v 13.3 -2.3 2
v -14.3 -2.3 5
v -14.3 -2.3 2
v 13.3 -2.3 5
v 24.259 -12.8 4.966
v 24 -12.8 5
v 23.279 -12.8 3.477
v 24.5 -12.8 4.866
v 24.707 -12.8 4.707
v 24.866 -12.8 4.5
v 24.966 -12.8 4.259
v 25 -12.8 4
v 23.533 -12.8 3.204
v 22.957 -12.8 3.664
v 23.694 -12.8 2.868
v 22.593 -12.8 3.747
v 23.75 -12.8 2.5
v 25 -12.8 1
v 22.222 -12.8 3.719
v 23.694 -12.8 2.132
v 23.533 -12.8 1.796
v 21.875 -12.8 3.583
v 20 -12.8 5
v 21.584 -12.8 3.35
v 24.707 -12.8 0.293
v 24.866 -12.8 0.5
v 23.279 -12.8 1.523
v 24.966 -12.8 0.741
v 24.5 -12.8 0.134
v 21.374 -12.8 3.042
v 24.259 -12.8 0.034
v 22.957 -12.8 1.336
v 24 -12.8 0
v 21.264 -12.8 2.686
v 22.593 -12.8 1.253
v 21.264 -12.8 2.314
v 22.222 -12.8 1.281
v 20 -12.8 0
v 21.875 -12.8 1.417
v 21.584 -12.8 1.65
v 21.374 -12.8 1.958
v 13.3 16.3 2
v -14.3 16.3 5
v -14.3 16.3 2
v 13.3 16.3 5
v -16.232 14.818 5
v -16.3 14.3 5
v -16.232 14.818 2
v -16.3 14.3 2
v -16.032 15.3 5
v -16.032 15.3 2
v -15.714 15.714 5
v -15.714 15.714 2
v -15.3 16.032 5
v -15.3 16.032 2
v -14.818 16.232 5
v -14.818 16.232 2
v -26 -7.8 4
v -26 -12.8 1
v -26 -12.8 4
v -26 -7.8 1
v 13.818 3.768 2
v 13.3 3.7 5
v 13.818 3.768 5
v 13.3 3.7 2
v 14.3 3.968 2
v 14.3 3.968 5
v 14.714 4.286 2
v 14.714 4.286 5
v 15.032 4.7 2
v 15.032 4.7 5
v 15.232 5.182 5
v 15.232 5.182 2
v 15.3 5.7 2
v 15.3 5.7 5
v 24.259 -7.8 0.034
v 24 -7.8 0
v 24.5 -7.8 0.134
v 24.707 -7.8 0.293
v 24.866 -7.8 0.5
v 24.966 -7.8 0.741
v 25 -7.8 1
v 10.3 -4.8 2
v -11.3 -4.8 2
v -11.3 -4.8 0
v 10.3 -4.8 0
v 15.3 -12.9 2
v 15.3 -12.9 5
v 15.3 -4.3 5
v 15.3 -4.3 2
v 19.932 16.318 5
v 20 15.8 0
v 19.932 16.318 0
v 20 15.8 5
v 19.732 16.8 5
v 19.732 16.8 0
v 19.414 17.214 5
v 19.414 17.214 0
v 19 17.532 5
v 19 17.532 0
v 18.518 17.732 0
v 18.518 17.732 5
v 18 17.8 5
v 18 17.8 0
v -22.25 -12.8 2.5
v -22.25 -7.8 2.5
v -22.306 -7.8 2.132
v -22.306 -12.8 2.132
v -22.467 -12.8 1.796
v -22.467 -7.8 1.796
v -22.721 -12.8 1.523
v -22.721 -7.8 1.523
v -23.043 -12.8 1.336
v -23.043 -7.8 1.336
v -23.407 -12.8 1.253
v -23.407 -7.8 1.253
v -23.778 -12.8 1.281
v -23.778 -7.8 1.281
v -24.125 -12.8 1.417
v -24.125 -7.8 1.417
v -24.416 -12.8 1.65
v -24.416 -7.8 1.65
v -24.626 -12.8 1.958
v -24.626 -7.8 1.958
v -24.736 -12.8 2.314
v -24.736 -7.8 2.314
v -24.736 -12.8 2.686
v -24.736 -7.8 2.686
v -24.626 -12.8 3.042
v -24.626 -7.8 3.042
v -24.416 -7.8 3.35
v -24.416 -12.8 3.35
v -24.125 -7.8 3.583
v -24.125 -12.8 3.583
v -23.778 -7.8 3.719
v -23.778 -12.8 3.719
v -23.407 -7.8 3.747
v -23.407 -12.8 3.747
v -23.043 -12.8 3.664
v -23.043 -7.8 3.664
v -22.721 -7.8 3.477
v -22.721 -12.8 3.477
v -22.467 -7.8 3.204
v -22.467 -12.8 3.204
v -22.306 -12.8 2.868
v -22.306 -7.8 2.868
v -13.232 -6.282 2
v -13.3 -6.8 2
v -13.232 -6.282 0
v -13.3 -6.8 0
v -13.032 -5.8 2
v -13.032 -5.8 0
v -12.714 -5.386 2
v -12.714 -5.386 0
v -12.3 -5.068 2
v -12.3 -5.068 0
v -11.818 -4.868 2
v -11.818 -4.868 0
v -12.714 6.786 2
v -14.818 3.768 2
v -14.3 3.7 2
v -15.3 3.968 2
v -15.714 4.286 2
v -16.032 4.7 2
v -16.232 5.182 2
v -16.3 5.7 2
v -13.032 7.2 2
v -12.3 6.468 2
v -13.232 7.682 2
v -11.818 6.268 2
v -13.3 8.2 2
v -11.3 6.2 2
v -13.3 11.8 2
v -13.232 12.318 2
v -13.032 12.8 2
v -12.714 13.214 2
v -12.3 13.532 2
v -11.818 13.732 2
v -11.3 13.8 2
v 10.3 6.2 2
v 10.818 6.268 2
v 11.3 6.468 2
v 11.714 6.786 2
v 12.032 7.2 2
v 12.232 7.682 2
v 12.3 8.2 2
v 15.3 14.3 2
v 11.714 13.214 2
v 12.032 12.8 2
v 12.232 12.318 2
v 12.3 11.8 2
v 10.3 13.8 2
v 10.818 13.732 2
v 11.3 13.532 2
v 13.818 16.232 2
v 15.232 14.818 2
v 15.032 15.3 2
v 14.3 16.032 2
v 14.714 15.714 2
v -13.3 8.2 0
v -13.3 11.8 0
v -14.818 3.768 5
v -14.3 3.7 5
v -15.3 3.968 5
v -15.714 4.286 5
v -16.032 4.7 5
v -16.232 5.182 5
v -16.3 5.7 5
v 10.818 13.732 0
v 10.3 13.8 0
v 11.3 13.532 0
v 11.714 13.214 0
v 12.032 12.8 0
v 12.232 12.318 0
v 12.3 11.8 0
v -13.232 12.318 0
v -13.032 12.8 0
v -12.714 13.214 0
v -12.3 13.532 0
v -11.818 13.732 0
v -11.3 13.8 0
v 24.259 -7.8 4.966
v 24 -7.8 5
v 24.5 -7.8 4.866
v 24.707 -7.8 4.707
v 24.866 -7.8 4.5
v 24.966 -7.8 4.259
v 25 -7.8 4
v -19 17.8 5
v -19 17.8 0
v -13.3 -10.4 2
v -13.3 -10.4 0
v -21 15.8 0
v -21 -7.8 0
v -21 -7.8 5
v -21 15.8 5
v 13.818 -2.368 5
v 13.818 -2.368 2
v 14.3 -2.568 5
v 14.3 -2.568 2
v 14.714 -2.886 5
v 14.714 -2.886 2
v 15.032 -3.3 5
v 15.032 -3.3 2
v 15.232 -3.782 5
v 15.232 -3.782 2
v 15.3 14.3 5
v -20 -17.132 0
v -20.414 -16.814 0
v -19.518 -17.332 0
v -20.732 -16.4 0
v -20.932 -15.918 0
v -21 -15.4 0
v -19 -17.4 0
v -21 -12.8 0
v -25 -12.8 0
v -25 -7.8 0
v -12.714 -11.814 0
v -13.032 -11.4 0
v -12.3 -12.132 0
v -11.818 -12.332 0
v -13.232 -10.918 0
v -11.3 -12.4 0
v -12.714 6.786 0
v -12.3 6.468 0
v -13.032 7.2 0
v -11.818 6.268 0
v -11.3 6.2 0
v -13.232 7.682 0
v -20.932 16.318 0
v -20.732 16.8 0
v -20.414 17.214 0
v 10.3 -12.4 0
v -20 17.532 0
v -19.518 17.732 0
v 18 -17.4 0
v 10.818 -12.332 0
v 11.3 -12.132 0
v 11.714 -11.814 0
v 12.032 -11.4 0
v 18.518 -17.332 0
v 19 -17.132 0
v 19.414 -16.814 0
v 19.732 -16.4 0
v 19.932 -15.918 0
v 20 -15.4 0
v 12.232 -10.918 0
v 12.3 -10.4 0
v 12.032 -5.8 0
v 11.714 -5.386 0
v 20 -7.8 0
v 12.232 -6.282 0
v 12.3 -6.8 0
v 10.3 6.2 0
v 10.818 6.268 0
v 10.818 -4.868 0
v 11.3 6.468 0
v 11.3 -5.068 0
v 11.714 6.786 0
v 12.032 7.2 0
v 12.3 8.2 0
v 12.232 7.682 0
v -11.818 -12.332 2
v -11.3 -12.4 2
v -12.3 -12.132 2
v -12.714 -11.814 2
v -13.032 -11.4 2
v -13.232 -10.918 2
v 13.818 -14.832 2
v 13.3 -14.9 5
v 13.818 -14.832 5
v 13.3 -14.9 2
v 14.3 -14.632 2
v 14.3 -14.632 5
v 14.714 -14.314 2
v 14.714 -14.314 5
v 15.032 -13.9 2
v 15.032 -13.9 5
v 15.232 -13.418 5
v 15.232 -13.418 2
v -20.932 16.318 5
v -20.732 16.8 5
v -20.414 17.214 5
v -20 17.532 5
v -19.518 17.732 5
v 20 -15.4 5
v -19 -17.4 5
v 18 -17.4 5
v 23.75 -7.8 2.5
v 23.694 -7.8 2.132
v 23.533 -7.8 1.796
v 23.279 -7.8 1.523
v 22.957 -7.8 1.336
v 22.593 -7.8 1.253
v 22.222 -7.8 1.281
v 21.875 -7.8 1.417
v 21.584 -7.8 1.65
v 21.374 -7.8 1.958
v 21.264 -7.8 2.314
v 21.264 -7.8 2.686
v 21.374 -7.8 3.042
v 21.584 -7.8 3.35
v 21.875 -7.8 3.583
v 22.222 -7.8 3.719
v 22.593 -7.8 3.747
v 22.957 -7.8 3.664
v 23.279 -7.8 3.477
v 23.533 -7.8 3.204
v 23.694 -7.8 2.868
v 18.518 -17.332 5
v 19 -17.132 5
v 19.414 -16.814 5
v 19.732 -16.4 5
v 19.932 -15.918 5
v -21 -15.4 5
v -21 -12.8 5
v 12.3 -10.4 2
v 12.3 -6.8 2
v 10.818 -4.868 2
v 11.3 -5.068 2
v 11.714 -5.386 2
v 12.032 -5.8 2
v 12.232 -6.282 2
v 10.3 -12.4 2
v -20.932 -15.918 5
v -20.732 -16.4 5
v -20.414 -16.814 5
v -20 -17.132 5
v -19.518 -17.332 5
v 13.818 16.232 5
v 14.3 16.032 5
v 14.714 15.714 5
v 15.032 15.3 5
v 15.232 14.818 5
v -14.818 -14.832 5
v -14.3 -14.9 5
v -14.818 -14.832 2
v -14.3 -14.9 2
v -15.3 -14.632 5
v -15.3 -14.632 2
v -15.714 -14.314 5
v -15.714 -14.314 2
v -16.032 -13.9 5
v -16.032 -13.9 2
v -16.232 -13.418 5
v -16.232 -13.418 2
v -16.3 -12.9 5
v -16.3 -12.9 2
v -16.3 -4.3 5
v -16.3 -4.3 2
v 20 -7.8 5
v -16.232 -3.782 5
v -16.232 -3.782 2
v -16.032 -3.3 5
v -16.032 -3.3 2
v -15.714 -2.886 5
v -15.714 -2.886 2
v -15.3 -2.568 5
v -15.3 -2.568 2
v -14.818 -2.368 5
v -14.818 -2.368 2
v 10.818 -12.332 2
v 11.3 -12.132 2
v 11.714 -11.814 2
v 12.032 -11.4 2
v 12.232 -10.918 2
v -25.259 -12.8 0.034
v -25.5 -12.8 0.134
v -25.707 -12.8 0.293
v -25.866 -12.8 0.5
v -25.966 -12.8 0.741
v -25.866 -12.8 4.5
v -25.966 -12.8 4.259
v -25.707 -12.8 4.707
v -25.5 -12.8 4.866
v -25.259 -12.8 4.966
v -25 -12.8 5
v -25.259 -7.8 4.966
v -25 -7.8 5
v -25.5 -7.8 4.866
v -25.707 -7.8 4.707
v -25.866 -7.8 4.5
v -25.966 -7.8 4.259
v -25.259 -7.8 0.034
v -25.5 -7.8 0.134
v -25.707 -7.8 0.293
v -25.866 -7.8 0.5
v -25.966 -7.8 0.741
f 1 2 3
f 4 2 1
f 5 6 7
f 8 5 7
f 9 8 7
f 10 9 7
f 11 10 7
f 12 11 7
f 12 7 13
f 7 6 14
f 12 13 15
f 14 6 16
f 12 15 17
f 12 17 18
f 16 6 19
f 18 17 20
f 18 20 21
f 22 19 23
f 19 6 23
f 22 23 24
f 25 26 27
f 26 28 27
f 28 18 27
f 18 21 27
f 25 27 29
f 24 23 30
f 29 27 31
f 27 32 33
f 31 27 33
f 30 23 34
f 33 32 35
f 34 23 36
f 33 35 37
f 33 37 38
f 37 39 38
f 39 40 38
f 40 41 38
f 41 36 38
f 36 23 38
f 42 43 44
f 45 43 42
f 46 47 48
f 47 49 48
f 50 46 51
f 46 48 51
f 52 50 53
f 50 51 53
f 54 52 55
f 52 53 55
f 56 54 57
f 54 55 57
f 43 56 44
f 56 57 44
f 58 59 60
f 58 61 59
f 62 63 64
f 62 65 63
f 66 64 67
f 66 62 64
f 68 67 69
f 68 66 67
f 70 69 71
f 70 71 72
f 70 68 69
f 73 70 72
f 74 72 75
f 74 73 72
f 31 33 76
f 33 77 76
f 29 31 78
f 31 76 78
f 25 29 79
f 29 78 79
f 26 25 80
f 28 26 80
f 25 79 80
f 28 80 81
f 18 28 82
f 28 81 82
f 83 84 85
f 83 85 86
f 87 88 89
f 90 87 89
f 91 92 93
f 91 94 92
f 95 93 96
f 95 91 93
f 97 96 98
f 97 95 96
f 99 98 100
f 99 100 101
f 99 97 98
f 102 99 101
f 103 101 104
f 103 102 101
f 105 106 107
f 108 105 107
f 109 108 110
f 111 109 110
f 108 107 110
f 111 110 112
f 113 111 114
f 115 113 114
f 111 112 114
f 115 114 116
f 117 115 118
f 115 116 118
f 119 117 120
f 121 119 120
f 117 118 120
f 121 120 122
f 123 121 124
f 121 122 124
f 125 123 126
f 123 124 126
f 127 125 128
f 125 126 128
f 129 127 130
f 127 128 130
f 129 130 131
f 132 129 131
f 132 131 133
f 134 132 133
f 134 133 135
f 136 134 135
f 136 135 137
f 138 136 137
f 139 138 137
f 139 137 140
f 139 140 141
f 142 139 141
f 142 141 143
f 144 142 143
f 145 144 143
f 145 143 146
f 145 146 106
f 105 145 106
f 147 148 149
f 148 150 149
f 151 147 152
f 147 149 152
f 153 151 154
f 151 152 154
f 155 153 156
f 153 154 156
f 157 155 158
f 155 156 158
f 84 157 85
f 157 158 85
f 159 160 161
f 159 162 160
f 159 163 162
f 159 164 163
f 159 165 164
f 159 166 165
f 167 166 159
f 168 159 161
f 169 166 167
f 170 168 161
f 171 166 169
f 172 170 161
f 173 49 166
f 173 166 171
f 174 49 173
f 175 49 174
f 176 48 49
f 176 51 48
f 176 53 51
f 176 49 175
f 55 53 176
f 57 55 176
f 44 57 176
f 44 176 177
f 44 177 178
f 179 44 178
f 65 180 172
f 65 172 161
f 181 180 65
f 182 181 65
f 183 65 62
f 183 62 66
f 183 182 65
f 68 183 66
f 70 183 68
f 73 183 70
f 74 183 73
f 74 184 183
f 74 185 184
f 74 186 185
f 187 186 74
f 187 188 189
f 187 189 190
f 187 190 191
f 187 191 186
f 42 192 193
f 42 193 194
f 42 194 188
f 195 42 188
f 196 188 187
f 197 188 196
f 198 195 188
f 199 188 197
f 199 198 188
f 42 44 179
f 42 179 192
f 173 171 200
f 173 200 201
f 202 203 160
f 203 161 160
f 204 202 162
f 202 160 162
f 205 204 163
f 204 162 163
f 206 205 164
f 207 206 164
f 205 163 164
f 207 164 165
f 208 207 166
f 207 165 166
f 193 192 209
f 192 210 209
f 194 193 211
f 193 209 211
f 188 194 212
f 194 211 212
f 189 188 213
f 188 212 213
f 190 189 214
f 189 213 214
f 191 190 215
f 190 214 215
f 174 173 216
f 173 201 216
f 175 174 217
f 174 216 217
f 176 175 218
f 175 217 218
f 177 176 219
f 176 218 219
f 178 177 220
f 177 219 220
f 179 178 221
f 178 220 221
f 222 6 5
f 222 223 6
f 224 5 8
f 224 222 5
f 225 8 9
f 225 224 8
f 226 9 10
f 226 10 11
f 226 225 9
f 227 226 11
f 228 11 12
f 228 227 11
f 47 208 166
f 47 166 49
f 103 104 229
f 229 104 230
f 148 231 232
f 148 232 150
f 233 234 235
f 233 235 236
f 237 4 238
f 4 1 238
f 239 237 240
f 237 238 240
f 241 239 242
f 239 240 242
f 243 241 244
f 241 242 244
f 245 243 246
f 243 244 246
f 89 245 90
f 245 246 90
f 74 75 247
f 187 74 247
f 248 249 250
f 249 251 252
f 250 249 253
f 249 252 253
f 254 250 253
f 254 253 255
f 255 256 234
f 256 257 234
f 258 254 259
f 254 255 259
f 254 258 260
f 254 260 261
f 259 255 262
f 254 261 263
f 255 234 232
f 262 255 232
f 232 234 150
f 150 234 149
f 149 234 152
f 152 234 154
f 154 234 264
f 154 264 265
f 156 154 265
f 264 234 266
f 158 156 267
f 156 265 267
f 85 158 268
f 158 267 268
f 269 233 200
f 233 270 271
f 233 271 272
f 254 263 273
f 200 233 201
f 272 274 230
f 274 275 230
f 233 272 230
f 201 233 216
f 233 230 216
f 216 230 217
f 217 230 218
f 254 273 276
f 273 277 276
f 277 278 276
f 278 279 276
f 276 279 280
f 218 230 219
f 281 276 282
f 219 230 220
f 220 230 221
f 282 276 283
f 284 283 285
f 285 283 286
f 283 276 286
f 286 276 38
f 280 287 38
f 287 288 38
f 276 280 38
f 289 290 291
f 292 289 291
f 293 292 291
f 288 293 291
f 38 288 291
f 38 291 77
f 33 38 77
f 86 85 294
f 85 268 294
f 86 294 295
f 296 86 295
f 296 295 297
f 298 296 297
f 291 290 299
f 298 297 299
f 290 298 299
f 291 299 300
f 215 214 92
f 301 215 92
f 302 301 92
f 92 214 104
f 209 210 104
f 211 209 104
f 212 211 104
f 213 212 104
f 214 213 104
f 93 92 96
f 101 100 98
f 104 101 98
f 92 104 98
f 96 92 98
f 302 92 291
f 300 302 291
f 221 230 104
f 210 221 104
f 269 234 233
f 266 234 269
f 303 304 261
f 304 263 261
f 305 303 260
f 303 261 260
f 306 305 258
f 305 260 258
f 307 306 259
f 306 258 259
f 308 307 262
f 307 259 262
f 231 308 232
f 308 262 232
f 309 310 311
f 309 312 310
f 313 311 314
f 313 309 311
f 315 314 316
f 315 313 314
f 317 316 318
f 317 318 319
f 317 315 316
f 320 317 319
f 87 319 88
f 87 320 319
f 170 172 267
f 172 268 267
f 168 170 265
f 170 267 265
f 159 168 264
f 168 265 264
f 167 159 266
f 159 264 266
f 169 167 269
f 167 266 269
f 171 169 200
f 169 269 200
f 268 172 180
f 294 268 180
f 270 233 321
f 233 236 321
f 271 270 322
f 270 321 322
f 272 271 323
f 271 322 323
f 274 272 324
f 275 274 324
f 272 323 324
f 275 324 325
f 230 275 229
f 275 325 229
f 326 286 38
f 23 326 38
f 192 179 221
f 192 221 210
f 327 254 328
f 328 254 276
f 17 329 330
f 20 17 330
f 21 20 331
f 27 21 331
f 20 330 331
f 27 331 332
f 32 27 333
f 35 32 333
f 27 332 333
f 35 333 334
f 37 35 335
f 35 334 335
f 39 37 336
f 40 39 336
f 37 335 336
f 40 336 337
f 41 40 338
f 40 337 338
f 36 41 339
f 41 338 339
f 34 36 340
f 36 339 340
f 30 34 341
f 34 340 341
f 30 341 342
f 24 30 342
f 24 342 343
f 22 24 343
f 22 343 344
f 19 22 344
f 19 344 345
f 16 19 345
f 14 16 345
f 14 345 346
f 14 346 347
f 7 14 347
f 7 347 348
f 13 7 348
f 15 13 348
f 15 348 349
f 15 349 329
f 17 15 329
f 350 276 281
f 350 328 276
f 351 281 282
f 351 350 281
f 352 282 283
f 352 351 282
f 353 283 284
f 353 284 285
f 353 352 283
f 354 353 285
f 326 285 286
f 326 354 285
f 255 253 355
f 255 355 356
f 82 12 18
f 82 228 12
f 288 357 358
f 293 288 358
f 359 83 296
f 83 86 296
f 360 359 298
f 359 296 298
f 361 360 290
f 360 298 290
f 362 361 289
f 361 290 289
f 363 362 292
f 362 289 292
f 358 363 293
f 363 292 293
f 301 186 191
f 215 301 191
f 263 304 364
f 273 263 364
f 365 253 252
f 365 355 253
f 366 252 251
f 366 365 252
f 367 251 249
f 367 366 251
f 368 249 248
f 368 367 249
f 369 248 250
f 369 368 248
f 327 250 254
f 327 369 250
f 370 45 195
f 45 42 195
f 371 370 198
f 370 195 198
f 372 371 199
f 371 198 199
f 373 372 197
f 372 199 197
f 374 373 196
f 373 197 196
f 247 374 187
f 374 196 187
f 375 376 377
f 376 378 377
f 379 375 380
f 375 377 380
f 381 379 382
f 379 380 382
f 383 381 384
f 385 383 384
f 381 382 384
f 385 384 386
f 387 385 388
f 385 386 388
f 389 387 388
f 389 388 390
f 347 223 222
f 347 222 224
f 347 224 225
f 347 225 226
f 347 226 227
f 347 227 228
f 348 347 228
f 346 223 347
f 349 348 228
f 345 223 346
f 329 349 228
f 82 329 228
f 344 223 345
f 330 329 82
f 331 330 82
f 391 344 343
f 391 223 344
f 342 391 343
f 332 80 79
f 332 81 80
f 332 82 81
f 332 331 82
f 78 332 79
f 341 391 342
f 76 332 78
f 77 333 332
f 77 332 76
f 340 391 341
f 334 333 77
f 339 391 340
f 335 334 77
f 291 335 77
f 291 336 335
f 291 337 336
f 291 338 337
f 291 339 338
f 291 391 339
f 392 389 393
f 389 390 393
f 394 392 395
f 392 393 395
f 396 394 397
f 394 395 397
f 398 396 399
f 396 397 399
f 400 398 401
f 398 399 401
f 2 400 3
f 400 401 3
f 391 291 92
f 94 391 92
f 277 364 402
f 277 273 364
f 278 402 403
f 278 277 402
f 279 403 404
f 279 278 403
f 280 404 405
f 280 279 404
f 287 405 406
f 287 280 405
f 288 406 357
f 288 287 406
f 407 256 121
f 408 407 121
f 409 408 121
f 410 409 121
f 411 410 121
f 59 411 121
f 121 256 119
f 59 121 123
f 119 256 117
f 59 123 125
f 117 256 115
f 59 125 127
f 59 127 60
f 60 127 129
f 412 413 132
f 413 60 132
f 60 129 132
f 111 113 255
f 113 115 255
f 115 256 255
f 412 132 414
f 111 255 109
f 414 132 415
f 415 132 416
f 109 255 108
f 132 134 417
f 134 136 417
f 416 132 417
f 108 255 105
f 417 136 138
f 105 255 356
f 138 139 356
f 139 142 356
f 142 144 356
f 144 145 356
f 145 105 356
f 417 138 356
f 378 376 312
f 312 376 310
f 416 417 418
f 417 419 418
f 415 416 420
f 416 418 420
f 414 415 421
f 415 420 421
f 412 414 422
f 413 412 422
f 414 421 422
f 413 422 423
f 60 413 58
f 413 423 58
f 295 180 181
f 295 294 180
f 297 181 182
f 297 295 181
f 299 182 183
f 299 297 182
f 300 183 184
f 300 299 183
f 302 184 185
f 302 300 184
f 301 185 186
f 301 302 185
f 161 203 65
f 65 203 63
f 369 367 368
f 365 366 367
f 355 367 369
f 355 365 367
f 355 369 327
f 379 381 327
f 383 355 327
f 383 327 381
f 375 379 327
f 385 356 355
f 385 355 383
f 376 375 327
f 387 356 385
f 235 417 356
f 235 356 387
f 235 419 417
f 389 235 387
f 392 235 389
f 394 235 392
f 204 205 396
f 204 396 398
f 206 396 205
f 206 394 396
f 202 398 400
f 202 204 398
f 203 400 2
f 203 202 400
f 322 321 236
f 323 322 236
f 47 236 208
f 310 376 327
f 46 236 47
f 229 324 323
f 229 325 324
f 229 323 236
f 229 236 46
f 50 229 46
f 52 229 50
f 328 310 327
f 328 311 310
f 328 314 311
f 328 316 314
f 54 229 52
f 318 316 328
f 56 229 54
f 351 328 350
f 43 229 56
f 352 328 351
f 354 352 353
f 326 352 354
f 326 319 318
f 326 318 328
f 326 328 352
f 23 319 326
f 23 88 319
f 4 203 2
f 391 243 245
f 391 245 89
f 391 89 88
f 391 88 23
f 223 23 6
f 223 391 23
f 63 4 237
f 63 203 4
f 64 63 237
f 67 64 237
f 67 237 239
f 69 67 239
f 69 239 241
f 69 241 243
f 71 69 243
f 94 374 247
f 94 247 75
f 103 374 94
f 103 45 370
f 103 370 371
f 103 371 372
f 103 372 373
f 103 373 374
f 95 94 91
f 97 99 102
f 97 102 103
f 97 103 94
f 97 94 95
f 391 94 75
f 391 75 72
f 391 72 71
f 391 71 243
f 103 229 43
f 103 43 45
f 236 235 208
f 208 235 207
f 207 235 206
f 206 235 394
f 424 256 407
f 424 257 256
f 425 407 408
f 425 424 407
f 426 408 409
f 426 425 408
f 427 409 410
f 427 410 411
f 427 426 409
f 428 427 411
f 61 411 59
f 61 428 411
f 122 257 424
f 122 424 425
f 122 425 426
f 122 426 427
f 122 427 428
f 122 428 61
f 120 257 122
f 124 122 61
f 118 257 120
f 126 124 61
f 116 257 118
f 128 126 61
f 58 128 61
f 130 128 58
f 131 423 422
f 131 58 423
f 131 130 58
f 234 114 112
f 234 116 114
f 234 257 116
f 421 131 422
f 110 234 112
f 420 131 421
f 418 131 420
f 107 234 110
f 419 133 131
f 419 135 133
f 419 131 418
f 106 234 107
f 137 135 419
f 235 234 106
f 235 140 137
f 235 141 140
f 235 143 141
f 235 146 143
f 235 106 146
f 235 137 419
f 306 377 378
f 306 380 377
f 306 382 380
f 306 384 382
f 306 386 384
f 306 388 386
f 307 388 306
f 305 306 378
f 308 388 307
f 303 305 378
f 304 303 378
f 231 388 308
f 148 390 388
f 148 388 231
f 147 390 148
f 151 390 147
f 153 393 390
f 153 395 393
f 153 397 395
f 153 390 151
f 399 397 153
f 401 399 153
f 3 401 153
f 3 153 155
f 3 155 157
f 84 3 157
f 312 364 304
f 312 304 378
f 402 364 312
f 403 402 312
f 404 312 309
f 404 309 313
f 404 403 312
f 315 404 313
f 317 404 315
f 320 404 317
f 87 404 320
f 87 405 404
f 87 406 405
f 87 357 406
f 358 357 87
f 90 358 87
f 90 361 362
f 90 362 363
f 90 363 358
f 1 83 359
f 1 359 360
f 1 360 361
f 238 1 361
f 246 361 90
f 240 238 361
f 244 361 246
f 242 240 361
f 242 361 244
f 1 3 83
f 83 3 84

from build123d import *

# Parameters (mm, degrees)
SKETCH1_W                 = 42
SKETCH1_H                 = 43
BOSS_EXTRUDE1_DEPTH       = 5
SKETCH2_W                 = 31.6
SKETCH2_H                 = 12.6
CUT_EXTRUDE1_DEPTH        = 3
SKETCH3_W                 = 25.6
SKETCH3_H                 = 7.6
CUT_EXTRUDE2_DEPTH        = 3
CUT_EXTRUDE3_DEPTH        = 5
SKETCH5_W                 = 5
SKETCH5_H                 = 5
BOSS_EXTRUDE2_DEPTH       = 5
SKETCH6_W                 = 5
SKETCH6_H                 = 5
BOSS_EXTRUDE3_DEPTH       = 5
FILLET1_R                 = 2
FILLET2_R                 = 1
M3X0_5_TAPPED_HOLE1_D     = 2.5
M3X0_5_TAPPED_HOLE1_DEPTH = 7.5
M3X0_5_TAPPED_HOLE1_TIP   = 0.751075774


with BuildPart() as part:
    # Sketch1 → Boss-Extrude1 (new body)
    with BuildSketch(Plane.XY):
        Rectangle(SKETCH1_W, SKETCH1_H)
    extrude(amount=BOSS_EXTRUDE1_DEPTH)

    # Sketch2 → Cut-Extrude1 (cut)
    with BuildSketch(Plane.XY.offset(5)):
        with Locations((-0.5, 10)):
            Rectangle(SKETCH2_W, SKETCH2_H)
        with Locations((-0.5, -8.6)):
            Rectangle(SKETCH2_W, SKETCH2_H)
    extrude(amount=-CUT_EXTRUDE1_DEPTH, mode=Mode.SUBTRACT)

    # Sketch3 → Cut-Extrude2 (cut)
    with BuildSketch(Plane.XY.offset(2)):
        with Locations((-0.5, 10)):
            Rectangle(SKETCH3_W, SKETCH3_H)
        with Locations((-0.5, -8.6)):
            Rectangle(SKETCH3_W, SKETCH3_H)
    extrude(amount=-CUT_EXTRUDE2_DEPTH, mode=Mode.SUBTRACT)

    # Sketch4 → Cut-Extrude3 (cut)
    with BuildSketch(Plane(origin=(0, 0, 0), x_dir=(-1, 0, 0), z_dir=(0, 0, -1))):
        Polygon((-15.288574128, 21.5), (-21, 21.5), (-21, 16.307906388), (-21, -16.83473783), (-21, -21.5), (-15.288574128, -21.5), (16.313805872, -21.5), (21, -21.5), (21, -17.4), (-20, -17.4), (-20, 17.8), (21, 17.8), (21, 21.5), (16.313805872, 21.5), align=None)
    extrude(amount=-CUT_EXTRUDE3_DEPTH, mode=Mode.SUBTRACT)

    # Sketch5 → Boss-Extrude2 (add)
    with BuildSketch(Plane(origin=(20, 0, 0), x_dir=(0, 0, -1), z_dir=(1, 0, 0))):
        with Locations((-2.5, -10.3)):
            Rectangle(SKETCH5_W, SKETCH5_H)
    extrude(amount=BOSS_EXTRUDE2_DEPTH)

    # Sketch6 → Boss-Extrude3 (add)
    with BuildSketch(Plane.ZY.offset(21)):
        with Locations((2.5, -10.3)):
            Rectangle(SKETCH6_W, SKETCH6_H)
    extrude(amount=BOSS_EXTRUDE3_DEPTH)

    # Fillet1
    fillet1_edges = [part.edges().sort_by_distance(p)[0] for p in [
        (-16.3, 3.7, 3.5),
        (-16.3, 16.3, 3.5),
        (15.3, 16.3, 3.5),
        (15.3, 3.7, 3.5),
        (-16.3, -14.9, 3.5),
        (-16.3, -2.3, 3.5),
        (15.3, -2.3, 3.5),
        (15.3, -14.9, 3.5),
        (-13.3, 6.2, 1),
        (-13.3, 13.8, 1),
        (12.3, 13.8, 1),
        (12.3, 6.2, 1),
        (-13.3, -12.4, 1),
        (-13.3, -4.8, 1),
        (12.3, -4.8, 1),
        (12.3, -12.4, 1),
        (20, 17.8, 2.5),
        (20, -17.4, 2.5),
        (-21, -17.4, 2.5),
        (-21, 17.8, 2.5),
    ]]
    fillet(fillet1_edges, radius=FILLET1_R)

    # Fillet2
    fillet2_edges = [part.edges().sort_by_distance(p)[0] for p in [
        (25, -10.3, 0),
        (25, -10.3, 5),
        (-26, -10.3, 0),
        (-26, -10.3, 5),
    ]]
    fillet(fillet2_edges, radius=FILLET2_R)

    # M3x0.5 Tapped Hole1
    with Locations(Plane(origin=(-23.5, -12.8, 2.5), x_dir=(-1, 0, 0), z_dir=(0, -1, 0))):
        with Locations((0, 0), (-46, 0)):
            Hole(M3X0_5_TAPPED_HOLE1_D / 2, depth=M3X0_5_TAPPED_HOLE1_DEPTH)
            with Locations((0, 0, -(M3X0_5_TAPPED_HOLE1_DEPTH + M3X0_5_TAPPED_HOLE1_TIP / 2))):  # 118° drill point
                Cone(0, M3X0_5_TAPPED_HOLE1_D / 2, M3X0_5_TAPPED_HOLE1_TIP, mode=Mode.SUBTRACT)


solid = part.part
